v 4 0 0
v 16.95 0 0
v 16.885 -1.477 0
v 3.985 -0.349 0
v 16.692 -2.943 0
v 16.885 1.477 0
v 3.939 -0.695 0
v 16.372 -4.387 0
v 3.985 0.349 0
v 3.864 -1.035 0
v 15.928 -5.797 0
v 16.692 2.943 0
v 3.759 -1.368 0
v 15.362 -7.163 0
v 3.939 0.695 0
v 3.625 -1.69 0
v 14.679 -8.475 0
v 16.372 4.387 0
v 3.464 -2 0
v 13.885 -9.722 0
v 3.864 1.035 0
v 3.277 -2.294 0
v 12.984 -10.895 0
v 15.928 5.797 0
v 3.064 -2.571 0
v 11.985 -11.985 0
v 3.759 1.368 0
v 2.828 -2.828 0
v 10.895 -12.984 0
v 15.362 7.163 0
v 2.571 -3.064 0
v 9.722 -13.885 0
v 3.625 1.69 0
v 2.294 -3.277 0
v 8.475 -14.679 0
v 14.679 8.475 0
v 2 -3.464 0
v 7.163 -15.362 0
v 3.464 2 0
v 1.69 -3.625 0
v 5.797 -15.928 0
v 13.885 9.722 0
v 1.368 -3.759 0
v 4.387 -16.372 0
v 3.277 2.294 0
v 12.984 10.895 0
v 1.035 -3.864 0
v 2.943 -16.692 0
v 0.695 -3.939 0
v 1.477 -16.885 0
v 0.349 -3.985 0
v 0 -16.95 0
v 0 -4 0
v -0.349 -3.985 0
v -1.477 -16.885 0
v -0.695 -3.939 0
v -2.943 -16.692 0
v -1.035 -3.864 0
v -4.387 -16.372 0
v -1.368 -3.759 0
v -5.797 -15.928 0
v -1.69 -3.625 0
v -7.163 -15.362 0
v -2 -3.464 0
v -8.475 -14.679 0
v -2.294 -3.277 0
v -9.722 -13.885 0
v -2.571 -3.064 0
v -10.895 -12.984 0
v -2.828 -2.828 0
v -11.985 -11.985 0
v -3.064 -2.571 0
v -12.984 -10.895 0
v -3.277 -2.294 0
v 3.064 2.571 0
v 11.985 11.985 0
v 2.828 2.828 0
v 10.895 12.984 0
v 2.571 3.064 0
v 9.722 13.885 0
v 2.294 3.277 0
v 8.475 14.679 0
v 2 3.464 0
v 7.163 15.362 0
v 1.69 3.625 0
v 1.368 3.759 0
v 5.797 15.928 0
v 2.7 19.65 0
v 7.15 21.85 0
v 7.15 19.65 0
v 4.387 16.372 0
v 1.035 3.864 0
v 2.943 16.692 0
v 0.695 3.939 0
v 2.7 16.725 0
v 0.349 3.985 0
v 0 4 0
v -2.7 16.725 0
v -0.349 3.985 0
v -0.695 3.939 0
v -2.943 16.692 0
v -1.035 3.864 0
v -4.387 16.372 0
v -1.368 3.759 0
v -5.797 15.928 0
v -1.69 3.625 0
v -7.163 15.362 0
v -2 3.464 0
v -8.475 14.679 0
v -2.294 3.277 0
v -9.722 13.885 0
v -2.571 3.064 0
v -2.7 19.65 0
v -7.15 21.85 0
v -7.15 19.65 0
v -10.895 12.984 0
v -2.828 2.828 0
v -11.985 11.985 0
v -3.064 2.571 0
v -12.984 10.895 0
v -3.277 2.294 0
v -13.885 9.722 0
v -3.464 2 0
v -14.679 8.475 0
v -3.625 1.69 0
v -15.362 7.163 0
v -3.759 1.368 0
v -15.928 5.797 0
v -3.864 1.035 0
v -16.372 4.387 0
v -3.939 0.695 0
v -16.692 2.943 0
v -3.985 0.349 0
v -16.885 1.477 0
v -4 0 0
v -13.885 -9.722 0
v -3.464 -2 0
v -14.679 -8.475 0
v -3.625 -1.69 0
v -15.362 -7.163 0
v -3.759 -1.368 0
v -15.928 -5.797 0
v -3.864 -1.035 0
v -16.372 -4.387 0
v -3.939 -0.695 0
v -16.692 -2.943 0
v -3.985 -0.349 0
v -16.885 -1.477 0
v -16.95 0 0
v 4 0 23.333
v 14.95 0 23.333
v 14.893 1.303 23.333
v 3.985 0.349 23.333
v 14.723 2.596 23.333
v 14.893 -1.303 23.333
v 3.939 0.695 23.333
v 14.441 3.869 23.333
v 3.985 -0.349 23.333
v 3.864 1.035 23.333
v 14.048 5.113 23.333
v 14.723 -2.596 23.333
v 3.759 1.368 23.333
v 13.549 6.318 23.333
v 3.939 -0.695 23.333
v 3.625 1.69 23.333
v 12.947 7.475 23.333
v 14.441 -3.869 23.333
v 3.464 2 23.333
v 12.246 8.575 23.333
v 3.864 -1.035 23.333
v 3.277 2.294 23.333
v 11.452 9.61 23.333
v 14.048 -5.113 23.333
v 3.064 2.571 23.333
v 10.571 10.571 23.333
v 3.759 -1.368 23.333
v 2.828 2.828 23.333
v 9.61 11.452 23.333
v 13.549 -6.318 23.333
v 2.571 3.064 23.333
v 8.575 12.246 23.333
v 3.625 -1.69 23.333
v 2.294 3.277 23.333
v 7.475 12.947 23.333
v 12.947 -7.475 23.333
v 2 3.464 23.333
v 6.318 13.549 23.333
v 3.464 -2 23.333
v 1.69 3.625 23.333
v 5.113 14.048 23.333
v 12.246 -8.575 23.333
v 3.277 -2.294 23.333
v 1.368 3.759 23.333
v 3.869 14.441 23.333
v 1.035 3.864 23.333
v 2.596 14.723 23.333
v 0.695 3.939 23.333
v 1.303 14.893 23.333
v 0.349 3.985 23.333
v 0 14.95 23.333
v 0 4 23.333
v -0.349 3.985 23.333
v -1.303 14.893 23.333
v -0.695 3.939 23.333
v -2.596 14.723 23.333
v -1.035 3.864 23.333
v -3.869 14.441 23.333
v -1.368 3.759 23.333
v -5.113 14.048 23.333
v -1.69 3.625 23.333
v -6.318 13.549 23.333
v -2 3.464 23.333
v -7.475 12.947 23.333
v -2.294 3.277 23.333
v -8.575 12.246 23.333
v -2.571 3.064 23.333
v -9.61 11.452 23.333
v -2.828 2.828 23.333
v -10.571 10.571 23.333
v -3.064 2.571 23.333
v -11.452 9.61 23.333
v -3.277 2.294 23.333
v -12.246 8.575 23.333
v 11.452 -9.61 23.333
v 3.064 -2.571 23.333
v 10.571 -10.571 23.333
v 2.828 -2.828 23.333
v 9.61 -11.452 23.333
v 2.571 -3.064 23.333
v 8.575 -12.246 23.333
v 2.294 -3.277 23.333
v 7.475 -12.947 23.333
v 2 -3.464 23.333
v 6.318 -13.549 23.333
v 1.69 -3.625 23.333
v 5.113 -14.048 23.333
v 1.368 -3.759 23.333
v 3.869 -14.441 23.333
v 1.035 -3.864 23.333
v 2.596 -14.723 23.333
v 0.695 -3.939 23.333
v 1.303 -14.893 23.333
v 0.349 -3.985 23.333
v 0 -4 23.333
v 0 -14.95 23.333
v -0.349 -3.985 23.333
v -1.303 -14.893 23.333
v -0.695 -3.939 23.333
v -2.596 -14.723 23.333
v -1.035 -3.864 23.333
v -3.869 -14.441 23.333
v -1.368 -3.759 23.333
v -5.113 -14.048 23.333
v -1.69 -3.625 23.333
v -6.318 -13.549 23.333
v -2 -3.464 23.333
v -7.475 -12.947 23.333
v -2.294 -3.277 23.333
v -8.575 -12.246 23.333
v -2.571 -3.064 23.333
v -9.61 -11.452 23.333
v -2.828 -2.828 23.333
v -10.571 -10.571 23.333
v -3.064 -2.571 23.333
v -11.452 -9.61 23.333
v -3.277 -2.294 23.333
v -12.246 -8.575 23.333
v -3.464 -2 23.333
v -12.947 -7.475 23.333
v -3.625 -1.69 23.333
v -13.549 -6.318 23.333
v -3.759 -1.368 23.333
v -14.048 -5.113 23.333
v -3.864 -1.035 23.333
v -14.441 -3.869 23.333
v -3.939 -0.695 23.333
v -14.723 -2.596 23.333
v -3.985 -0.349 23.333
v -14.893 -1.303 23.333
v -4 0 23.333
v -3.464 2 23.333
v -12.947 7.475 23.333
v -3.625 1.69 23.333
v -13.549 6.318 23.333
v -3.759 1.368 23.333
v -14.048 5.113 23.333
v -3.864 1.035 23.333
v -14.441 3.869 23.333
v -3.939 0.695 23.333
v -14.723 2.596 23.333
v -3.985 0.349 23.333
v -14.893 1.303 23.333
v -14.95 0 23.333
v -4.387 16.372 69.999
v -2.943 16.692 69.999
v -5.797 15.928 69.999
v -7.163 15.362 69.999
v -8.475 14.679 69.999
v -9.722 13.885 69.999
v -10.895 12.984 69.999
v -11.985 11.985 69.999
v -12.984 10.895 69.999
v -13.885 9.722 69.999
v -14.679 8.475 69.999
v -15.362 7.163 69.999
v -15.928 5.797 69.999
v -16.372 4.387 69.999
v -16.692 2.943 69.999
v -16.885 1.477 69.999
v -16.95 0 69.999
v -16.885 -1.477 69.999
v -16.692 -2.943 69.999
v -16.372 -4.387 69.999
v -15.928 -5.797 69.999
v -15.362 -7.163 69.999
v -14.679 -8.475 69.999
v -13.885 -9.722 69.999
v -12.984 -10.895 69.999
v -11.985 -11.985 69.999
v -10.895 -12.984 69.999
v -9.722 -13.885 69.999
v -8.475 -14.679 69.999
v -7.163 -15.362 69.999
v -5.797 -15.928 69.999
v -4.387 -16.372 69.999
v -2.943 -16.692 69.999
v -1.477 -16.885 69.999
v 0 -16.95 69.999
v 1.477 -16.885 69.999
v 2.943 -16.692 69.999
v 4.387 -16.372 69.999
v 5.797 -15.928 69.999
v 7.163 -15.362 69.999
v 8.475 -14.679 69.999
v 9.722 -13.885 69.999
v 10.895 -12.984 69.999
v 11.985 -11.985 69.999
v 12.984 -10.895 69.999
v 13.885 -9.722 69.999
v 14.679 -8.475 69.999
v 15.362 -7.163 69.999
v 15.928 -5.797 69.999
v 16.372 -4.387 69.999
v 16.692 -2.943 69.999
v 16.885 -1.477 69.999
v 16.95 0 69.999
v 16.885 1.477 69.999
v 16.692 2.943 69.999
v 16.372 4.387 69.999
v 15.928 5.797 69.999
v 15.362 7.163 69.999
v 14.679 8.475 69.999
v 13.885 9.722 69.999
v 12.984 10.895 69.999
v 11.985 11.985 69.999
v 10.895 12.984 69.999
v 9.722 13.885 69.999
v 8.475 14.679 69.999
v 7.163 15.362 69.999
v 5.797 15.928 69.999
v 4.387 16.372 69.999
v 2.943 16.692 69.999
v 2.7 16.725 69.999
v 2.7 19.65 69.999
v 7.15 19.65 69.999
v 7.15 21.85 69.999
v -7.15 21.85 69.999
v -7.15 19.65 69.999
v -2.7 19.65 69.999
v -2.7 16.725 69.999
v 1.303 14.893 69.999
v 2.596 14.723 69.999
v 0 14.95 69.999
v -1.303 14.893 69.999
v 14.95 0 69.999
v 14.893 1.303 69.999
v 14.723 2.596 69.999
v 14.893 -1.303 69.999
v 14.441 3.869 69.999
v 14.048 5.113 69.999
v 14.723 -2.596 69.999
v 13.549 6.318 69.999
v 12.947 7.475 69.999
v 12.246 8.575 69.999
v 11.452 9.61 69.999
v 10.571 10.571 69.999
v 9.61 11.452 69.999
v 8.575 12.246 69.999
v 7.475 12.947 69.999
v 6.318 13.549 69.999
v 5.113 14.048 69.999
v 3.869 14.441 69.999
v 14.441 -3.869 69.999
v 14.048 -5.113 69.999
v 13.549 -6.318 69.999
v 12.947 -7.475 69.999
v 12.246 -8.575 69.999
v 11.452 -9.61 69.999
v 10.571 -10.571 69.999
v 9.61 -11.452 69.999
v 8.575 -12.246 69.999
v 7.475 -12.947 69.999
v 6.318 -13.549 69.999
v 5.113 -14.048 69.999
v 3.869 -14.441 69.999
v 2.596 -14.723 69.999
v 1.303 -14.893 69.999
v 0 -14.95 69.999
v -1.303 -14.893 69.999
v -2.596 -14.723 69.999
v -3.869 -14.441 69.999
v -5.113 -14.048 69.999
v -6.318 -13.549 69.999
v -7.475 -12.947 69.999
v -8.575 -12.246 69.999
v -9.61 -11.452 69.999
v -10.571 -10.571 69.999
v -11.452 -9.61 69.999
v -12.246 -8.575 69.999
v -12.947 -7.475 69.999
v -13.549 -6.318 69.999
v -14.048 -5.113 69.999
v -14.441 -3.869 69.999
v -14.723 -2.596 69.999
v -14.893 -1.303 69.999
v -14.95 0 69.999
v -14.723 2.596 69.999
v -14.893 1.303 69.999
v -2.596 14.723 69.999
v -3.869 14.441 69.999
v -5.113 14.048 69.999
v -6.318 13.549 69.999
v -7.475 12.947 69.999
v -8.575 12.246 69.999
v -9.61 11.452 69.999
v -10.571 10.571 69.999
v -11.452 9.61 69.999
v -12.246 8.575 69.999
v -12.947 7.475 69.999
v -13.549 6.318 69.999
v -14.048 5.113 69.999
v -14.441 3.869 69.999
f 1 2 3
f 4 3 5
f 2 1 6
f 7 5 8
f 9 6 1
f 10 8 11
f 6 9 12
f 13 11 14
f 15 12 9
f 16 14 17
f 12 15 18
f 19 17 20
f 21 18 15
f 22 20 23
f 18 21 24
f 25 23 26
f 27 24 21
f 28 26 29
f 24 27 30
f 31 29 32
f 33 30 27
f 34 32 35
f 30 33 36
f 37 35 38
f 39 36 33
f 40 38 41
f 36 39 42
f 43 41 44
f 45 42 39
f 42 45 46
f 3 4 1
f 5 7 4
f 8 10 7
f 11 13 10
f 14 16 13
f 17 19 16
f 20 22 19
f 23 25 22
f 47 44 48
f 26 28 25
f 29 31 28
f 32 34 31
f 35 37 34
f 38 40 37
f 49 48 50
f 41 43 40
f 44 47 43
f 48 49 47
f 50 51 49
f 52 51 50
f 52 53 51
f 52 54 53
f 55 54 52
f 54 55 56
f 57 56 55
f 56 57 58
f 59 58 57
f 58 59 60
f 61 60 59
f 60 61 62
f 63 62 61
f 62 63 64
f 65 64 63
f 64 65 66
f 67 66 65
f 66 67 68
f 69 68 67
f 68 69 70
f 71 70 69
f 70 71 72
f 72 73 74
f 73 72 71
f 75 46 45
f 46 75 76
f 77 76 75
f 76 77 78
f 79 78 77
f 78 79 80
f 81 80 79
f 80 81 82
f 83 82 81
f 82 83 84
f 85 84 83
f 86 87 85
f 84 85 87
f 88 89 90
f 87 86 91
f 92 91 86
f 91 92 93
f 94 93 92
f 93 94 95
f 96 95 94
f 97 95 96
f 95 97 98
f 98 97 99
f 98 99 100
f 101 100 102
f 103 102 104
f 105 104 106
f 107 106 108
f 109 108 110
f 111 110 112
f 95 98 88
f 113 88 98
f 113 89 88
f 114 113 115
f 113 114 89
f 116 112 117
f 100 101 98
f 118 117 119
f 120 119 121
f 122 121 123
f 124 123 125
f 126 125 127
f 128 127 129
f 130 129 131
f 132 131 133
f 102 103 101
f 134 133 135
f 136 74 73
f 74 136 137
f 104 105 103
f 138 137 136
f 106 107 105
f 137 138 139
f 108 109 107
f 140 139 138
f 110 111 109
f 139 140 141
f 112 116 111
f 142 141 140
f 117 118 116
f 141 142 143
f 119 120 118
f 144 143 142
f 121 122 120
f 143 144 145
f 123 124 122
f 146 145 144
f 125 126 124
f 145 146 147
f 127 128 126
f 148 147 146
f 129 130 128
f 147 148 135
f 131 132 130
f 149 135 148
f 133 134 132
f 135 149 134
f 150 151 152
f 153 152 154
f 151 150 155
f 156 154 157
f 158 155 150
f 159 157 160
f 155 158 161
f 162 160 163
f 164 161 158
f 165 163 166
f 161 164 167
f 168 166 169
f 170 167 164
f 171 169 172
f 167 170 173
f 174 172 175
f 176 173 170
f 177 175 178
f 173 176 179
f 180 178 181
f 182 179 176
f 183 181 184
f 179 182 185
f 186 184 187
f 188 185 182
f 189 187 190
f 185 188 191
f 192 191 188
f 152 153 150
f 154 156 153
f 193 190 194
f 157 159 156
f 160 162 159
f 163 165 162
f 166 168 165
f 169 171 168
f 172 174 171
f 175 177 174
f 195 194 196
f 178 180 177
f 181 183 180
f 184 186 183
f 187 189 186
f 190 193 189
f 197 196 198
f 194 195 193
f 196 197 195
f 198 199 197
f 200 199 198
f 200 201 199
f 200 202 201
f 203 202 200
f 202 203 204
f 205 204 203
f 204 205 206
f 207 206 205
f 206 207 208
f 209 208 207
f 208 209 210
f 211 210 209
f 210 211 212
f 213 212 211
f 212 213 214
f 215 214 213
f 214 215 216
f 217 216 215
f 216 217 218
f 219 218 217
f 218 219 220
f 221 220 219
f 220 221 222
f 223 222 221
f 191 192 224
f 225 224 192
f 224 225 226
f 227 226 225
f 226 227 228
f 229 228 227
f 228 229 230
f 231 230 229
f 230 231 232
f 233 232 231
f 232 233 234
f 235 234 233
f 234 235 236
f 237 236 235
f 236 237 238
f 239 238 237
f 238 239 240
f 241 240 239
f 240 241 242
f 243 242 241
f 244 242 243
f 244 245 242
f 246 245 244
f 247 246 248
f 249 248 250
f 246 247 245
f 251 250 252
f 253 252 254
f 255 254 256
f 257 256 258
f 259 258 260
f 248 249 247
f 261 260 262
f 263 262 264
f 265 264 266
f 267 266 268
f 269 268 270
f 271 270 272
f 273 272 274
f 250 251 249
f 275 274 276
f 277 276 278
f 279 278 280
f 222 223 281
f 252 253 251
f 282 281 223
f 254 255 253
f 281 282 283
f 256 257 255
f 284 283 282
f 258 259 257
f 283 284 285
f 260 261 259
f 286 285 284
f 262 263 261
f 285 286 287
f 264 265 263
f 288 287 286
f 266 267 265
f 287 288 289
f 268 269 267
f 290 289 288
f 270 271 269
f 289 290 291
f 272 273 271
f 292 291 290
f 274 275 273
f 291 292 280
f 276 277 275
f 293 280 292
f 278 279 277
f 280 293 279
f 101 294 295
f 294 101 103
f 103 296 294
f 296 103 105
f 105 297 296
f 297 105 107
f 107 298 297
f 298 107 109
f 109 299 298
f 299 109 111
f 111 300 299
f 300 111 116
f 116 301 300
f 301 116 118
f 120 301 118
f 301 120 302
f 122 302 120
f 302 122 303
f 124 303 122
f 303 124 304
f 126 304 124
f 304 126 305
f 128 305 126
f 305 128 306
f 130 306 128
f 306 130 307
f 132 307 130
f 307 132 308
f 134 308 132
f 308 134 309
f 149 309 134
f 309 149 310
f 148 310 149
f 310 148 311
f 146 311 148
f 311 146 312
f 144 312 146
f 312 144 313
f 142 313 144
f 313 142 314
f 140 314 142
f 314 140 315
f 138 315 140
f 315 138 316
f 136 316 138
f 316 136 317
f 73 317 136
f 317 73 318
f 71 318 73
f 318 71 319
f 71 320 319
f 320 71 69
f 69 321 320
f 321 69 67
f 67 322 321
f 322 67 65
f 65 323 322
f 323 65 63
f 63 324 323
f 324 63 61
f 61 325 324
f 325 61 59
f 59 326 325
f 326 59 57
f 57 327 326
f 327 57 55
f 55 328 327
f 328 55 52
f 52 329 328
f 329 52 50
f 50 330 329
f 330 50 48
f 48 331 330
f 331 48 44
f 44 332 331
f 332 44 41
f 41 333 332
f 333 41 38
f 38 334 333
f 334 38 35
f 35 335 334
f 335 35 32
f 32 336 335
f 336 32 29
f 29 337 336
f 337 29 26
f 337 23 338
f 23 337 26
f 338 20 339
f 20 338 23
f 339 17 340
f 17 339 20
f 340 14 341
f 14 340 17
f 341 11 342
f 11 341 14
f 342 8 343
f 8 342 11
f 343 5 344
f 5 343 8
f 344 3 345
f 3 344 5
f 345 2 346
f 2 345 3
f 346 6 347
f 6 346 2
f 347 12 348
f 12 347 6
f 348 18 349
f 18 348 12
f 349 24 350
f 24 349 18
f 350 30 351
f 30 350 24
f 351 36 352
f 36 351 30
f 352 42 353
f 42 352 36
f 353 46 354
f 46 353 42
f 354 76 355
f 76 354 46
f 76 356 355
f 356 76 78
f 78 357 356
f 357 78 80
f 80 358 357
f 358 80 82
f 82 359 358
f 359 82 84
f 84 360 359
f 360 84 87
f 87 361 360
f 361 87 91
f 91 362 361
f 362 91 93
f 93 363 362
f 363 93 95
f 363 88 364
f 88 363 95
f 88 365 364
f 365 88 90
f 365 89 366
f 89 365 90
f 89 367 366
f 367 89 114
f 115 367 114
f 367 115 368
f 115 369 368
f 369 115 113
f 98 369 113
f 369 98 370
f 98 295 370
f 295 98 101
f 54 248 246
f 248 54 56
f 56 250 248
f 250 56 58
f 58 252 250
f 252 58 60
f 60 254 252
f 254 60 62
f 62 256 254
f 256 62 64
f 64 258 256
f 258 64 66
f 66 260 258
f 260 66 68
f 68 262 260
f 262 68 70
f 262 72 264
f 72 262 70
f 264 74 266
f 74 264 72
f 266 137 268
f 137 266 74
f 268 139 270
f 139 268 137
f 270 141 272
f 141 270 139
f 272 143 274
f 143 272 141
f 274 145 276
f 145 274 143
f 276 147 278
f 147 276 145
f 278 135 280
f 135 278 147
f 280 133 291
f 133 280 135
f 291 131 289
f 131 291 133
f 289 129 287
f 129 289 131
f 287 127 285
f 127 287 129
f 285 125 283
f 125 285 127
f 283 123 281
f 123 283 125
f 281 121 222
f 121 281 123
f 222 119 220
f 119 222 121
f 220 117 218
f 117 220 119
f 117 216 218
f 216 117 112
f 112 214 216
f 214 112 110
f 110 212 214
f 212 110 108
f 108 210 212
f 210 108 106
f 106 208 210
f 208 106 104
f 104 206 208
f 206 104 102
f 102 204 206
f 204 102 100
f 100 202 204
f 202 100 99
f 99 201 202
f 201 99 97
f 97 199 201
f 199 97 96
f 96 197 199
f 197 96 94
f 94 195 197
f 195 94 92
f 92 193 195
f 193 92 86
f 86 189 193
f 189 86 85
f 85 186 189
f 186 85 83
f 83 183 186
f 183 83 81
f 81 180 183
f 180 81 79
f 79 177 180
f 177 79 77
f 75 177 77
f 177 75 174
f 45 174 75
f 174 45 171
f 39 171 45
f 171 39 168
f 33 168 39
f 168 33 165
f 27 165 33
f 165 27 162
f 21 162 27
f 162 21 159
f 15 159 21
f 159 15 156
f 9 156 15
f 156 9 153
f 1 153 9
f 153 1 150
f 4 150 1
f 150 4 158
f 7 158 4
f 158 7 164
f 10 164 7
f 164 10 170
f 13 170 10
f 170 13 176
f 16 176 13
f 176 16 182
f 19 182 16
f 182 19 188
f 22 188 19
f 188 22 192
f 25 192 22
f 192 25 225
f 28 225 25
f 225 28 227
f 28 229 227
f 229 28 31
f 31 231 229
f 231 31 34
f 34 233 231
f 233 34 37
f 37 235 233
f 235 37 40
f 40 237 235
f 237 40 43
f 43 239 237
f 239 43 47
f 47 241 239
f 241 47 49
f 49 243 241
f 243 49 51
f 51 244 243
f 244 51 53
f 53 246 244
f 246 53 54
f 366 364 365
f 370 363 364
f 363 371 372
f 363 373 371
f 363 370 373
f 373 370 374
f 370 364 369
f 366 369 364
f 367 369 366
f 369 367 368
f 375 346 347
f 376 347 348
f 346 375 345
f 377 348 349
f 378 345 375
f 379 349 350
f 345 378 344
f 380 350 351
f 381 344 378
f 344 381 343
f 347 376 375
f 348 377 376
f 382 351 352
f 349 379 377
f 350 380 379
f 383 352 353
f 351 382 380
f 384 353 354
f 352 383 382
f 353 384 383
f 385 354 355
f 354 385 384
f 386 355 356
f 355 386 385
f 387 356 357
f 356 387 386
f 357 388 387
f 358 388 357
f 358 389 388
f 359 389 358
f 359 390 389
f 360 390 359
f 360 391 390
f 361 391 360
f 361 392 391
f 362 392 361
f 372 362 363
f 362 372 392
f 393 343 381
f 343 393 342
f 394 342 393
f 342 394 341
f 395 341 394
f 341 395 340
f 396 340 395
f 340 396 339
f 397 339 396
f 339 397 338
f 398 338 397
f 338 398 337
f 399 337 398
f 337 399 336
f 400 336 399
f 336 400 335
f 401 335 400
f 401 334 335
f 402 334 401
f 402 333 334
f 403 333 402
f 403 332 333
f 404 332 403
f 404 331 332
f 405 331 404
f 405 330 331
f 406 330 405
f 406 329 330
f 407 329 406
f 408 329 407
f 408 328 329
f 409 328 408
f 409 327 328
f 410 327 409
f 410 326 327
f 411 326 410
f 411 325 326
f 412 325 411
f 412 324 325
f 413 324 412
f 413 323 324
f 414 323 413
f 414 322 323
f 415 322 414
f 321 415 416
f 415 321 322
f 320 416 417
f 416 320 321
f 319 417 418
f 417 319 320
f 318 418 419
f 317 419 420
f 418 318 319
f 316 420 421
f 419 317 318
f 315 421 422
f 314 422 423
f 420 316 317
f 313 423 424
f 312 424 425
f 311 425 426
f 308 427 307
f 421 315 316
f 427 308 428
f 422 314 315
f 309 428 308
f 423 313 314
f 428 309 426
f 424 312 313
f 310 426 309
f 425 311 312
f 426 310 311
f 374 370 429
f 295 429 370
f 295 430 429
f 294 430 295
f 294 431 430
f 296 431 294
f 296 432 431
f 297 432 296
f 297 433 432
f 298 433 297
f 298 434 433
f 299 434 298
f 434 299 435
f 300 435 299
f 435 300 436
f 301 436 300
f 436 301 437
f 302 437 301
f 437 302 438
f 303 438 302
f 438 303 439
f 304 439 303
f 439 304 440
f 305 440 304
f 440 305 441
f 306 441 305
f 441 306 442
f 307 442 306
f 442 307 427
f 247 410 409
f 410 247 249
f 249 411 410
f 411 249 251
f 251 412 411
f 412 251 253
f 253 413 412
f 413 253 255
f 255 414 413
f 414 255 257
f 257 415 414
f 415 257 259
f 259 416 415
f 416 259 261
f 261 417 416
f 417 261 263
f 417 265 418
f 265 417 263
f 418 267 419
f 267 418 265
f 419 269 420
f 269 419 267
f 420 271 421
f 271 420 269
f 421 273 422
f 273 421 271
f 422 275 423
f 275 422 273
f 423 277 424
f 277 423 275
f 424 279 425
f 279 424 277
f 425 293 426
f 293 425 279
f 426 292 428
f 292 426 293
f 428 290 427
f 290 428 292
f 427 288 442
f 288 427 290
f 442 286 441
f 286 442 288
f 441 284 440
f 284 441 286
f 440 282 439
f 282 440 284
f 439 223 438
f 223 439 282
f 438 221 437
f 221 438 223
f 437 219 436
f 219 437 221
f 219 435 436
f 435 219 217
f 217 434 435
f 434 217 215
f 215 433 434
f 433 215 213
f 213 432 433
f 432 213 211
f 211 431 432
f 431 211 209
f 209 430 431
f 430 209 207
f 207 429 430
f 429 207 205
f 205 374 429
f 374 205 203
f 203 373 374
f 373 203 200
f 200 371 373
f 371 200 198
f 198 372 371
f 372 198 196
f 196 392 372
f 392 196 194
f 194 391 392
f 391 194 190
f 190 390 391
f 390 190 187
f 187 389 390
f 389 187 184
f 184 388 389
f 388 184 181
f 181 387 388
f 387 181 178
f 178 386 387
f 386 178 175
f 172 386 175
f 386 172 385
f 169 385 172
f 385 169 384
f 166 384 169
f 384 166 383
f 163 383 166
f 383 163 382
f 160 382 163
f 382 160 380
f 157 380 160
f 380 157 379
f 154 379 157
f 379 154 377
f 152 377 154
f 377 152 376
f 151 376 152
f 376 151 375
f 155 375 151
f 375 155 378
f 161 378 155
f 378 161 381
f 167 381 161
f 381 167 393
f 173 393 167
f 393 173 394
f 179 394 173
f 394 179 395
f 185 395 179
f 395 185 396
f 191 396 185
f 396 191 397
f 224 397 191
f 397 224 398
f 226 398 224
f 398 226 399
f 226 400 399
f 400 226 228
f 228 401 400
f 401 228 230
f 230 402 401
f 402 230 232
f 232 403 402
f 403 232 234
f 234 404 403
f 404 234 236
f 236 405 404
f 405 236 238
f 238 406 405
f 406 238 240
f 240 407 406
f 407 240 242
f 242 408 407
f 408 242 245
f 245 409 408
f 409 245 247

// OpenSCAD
//---------------------------------------------------------------------------------------------
//-- Print of OpenBeam
//-- (c) Martin Korinek	m.ko@inode.at
//-- April-2015
//---------------------------------------------------------------------------------------------
//--
//---------------------------------------------------------------------------------------------


//fragment minimum angle
  $fa=5.0;

//fragment minimum size
  $fs=0.1;
  
	ExtrudedLength = 35;
	Radius = 16.95;
	BaseWidth = 5.4;
	TopWidth = 14.3;
	BaseLength = 2.7;
	Thickness = 2;


linear_extrude(height = ExtrudedLength*2/3)
{	
	difference()
	{
		circle(Radius);
		circle(4);
	}
	translate([-BaseWidth/2,Radius-Thickness,0])
		square([BaseWidth,BaseLength+Thickness]);
	translate([-TopWidth/2,Radius+BaseLength,0])	
		square([TopWidth,2.2]);
}
translate([0,0,ExtrudedLength*2/3-0.001])
{
linear_extrude(height = ExtrudedLength*4/3)
{	
	difference()
	{
		circle(Radius);
		circle(Radius-Thickness);
	}
	translate([-BaseWidth/2,Radius-Thickness,0])
		square([BaseWidth,BaseLength+Thickness]);
	translate([-TopWidth/2,Radius+BaseLength,0])	
		square([TopWidth,2.2]);
}
}
